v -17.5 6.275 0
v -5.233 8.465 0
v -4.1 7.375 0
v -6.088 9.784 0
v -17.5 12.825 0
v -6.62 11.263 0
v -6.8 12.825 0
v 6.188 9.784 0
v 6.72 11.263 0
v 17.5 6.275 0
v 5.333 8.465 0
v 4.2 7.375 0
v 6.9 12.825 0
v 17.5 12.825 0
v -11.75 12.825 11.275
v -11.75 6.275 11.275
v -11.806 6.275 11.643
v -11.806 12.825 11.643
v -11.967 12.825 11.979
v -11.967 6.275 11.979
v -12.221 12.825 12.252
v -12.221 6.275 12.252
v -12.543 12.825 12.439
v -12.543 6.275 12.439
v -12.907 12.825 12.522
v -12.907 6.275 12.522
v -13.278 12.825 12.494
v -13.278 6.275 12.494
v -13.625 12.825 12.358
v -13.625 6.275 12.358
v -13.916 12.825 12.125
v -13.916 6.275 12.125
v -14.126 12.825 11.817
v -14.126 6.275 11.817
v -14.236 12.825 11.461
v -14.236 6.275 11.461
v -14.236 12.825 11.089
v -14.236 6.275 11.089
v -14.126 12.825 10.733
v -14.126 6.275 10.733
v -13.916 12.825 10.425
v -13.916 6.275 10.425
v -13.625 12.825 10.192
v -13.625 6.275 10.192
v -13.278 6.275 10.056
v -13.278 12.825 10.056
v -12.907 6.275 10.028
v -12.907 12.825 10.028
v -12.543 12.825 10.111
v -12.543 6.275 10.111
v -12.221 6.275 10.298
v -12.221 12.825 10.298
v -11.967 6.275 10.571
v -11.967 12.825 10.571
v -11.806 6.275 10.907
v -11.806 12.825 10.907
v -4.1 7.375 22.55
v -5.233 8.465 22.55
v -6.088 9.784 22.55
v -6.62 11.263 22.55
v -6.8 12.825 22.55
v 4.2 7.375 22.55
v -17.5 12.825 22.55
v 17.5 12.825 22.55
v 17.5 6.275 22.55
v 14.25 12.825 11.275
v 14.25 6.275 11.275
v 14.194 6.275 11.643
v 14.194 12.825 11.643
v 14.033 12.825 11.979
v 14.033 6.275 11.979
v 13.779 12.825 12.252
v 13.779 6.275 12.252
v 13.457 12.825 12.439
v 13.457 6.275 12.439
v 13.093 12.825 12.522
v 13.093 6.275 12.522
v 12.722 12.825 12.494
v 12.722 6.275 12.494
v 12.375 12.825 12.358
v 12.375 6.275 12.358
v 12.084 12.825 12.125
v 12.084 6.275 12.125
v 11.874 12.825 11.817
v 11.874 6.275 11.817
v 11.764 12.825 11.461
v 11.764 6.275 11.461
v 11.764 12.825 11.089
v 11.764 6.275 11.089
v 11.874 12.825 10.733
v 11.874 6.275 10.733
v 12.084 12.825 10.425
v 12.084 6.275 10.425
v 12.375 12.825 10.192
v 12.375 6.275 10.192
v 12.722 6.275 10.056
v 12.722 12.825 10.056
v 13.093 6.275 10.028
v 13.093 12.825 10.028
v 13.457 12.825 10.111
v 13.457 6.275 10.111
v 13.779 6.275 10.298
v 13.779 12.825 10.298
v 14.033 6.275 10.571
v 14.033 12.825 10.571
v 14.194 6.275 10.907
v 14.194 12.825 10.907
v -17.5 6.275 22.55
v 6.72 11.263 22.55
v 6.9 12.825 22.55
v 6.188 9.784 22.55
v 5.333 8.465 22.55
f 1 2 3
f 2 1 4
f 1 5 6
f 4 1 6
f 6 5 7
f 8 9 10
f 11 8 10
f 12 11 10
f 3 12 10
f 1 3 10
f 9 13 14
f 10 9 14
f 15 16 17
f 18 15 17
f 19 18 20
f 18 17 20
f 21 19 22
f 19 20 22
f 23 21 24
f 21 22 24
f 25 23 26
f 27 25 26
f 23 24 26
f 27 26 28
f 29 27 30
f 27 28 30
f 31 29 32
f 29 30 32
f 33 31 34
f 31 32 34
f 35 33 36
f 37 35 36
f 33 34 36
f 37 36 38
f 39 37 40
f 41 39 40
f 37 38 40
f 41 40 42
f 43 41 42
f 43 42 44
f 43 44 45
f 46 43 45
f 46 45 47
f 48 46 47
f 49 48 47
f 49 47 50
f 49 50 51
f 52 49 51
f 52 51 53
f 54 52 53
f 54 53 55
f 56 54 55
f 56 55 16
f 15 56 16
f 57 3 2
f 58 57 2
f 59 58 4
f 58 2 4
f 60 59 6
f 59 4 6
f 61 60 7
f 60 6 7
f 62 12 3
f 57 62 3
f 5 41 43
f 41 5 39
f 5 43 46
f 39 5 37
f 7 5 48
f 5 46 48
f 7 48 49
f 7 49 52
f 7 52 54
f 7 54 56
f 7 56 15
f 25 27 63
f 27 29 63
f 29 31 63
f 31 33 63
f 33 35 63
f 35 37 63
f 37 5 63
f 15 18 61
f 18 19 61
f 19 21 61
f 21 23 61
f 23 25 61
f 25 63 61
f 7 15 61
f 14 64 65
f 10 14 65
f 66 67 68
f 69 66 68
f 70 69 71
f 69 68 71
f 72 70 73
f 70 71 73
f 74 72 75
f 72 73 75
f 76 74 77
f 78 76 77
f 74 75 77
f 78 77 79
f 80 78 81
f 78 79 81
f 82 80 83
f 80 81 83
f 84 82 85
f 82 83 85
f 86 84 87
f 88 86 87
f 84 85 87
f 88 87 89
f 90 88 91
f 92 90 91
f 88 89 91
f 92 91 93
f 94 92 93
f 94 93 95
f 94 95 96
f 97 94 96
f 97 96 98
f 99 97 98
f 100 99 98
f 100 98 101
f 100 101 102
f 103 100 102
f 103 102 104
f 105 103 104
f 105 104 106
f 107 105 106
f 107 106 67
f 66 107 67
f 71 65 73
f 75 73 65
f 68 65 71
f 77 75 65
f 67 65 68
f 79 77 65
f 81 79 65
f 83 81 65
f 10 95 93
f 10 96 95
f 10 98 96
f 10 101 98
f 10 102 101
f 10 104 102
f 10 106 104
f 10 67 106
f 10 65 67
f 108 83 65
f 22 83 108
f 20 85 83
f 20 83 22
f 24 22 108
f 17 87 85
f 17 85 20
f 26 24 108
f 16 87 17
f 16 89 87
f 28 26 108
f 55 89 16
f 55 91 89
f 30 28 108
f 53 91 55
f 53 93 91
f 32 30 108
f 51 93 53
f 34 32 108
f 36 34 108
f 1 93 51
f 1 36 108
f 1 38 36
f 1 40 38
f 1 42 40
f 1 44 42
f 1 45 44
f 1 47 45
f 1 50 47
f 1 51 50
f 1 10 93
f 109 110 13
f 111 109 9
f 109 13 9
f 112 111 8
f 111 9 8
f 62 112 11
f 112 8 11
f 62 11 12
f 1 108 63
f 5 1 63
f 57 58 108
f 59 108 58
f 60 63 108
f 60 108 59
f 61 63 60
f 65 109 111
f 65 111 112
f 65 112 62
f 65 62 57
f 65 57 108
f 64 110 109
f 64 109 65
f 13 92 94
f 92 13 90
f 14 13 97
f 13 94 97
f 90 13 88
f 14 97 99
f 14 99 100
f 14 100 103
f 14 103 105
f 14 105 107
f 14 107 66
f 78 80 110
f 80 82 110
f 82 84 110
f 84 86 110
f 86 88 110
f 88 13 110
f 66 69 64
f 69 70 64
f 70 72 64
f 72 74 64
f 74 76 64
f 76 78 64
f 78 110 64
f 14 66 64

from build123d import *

# Parameters (mm, degrees)
SKETCH1_W          = 98.9
SKETCH1_H          = 124.45
BODY_DEPTH         = 22.55
SKETCH4_W          = 7
SKETCH4_H          = 3
SKETCH4_W_2        = 3
SKETCH4_H_2        = 7
CUT_EXTRUDE1_DEPTH = 63
SKETCH5_W          = 8.299397568
SKETCH5_H          = 10.9
CUT_EXTRUDE2_DEPTH = 63
SKETCH6_W          = 98.9
SKETCH6_H          = 68.5
CUT_EXTRUDE3_DEPTH = 63
SKETCH7_W          = 22.55
SKETCH7_H          = 1.441759006
CUT_EXTRUDE4_DEPTH = 63
CUT_EXTRUDE5_DEPTH = 23.55
SKETCH9_R          = 1.25
CUT_EXTRUDE6_DEPTH = 10


with BuildPart() as part:
    # Sketch1 → body (new body)
    with BuildSketch(Plane.XY):
        Rectangle(SKETCH1_W, SKETCH1_H)
    extrude(amount=BODY_DEPTH)

    # Sketch4 → Cut-Extrude1 (cut)
    with BuildSketch(Plane(origin=(0, 0, 0), x_dir=(-1, 0, 0), z_dir=(0, 0, -1))):
        with Locations((0, 62.225)):
            Rectangle(SKETCH4_W, SKETCH4_H)
        with Locations((49.35, 12.775)):
            Rectangle(SKETCH4_W_2, SKETCH4_H_2)
        with Locations((-49.45, 12.875)):
            Rectangle(SKETCH4_W_2, SKETCH4_H_2)
    extrude(amount=-CUT_EXTRUDE1_DEPTH, mode=Mode.SUBTRACT)

    # Sketch5 → Cut-Extrude2 (cut)
    with BuildSketch(Plane(origin=(0, 0, 0), x_dir=(-1, 0, 0), z_dir=(0, 0, -1))):
        with Locations((-0.05, 12.825)):
            Rectangle(SKETCH5_W, SKETCH5_H)
        with BuildLine():
            Line((4.099698784, 18.275), (4.099698784, 7.375))
            ThreePointArc((4.099698784, 7.375), (6.087912376, 9.783860137), (6.8, 12.825))
            ThreePointArc((6.8, 12.825), (6.087912376, 15.866139863), (4.099698784, 18.275))
        make_face()
        with BuildLine():
            ThreePointArc((-4.199698784, 18.275), (-6.9, 12.825), (-4.199698784, 7.375))
            Line((-4.199698784, 7.375), (-4.199698784, 18.275))
        make_face()
    extrude(amount=-CUT_EXTRUDE2_DEPTH, mode=Mode.SUBTRACT)

    # Sketch6 → Cut-Extrude3 (cut)
    with BuildSketch(Plane(origin=(0, 0, 0), x_dir=(-1, 0, 0), z_dir=(0, 0, -1))):
        with BuildLine():
            Line((49.45, 19.275), (49.45, 62.225))
            Line((49.45, 62.225), (6.5, 62.225))
            Line((6.5, 62.225), (6.5, 22.275))
            ThreePointArc((6.5, 22.275), (8.621320344, 21.396320344), (9.5, 19.275))
            Line((9.5, 19.275), (49.45, 19.275))
        make_face()
        with BuildLine():
            Line((-49.45, 60.783244994), (-49.45, 19.391375139))
            Line((-49.45, 19.391375139), (-9.597617792, 19.297494249))
            ThreePointArc((-9.597617792, 19.297494249), (-8.71394336, 21.416738793), (-6.590558988, 22.290418797))
            Line((-6.590558988, 22.290418797), (-6.496484462, 62.225))
            Line((-6.496484462, 62.225), (-49.446603635, 62.225))
            Line((-49.446603635, 62.225), (-49.45, 60.783244994))
        make_face()
        with Locations((0, -27.975)):
            Rectangle(SKETCH6_W, SKETCH6_H)
    extrude(amount=-CUT_EXTRUDE3_DEPTH, mode=Mode.SUBTRACT)

    # Sketch7 → Cut-Extrude4 (cut)
    with BuildSketch(Plane(origin=(49.592912844, 0.116826812, 0), x_dir=(0, 0, 1), z_dir=(-0.999997225, -0.002355709, 0))):
        with Locations((11.275, 61.387466016)):
            Rectangle(SKETCH7_W, SKETCH7_H)
    extrude(amount=-CUT_EXTRUDE4_DEPTH, mode=Mode.SUBTRACT)

    # Sketch8 → Cut-Extrude5 (cut, through all)
    with BuildSketch(Plane.XY.offset(22.55)):
        with BuildLine():
            Line((-49.45, 6.275), (-17.5, 6.275))
            Line((-17.5, 6.275), (-17.5, 12.825))
            Line((-17.5, 12.825), (-6.8, 12.825))
            ThreePointArc((-6.8, 12.825), (-6.087912376, 15.866139863), (-4.099698784, 18.275))
            Line((-4.099698784, 18.275), (4.199698784, 18.275))
            ThreePointArc((4.199698784, 18.275), (6.187912376, 15.866139863), (6.9, 12.825))
            Line((6.9, 12.825), (17.5, 12.825))
            Line((17.5, 12.825), (17.5, 6.275))
            Line((17.5, 6.275), (49.45, 6.275))
            Line((49.45, 6.275), (49.45, 9.375))
            Line((49.45, 9.375), (47.95, 9.375))
            Line((47.95, 9.375), (47.95, 16.375))
            Line((47.95, 16.375), (49.45, 16.375))
            Line((49.45, 16.375), (49.45, 19.391375139))
            Line((49.45, 19.391375139), (9.597617792, 19.297494249))
            ThreePointArc((9.597617792, 19.297494249), (8.71394336, 21.416738793), (6.590558988, 22.290418797))
            Line((6.590558988, 22.290418797), (6.496484462, 62.225))
            Line((6.496484462, 62.225), (3.5, 62.225))
            Line((3.5, 62.225), (3.5, 60.725))
            Line((3.5, 60.725), (-3.5, 60.725))
            Line((-3.5, 60.725), (-3.5, 62.225))
            Line((-3.5, 62.225), (-6.5, 62.225))
            Line((-6.5, 62.225), (-6.5, 22.275))
            ThreePointArc((-6.5, 22.275), (-8.621320344, 21.396320344), (-9.5, 19.275))
            Line((-9.5, 19.275), (-49.45, 19.275))
            Line((-49.45, 19.275), (-49.45, 16.275))
            Line((-49.45, 16.275), (-47.85, 16.275))
            Line((-47.85, 16.275), (-47.85, 9.275))
            Line((-47.85, 9.275), (-49.45, 9.275))
            Line((-49.45, 9.275), (-49.45, 6.275))
        make_face()
    extrude(amount=-CUT_EXTRUDE5_DEPTH, mode=Mode.SUBTRACT)

    # Sketch9 → Cut-Extrude6 (cut)
    with BuildSketch(Plane.XZ.offset(-6.275)):
        with Locations((13, 11.275)):
            Circle(SKETCH9_R)
        with Locations((-13, 11.275)):
            Circle(SKETCH9_R)
    extrude(amount=-CUT_EXTRUDE6_DEPTH, mode=Mode.SUBTRACT)


solid = part.part
